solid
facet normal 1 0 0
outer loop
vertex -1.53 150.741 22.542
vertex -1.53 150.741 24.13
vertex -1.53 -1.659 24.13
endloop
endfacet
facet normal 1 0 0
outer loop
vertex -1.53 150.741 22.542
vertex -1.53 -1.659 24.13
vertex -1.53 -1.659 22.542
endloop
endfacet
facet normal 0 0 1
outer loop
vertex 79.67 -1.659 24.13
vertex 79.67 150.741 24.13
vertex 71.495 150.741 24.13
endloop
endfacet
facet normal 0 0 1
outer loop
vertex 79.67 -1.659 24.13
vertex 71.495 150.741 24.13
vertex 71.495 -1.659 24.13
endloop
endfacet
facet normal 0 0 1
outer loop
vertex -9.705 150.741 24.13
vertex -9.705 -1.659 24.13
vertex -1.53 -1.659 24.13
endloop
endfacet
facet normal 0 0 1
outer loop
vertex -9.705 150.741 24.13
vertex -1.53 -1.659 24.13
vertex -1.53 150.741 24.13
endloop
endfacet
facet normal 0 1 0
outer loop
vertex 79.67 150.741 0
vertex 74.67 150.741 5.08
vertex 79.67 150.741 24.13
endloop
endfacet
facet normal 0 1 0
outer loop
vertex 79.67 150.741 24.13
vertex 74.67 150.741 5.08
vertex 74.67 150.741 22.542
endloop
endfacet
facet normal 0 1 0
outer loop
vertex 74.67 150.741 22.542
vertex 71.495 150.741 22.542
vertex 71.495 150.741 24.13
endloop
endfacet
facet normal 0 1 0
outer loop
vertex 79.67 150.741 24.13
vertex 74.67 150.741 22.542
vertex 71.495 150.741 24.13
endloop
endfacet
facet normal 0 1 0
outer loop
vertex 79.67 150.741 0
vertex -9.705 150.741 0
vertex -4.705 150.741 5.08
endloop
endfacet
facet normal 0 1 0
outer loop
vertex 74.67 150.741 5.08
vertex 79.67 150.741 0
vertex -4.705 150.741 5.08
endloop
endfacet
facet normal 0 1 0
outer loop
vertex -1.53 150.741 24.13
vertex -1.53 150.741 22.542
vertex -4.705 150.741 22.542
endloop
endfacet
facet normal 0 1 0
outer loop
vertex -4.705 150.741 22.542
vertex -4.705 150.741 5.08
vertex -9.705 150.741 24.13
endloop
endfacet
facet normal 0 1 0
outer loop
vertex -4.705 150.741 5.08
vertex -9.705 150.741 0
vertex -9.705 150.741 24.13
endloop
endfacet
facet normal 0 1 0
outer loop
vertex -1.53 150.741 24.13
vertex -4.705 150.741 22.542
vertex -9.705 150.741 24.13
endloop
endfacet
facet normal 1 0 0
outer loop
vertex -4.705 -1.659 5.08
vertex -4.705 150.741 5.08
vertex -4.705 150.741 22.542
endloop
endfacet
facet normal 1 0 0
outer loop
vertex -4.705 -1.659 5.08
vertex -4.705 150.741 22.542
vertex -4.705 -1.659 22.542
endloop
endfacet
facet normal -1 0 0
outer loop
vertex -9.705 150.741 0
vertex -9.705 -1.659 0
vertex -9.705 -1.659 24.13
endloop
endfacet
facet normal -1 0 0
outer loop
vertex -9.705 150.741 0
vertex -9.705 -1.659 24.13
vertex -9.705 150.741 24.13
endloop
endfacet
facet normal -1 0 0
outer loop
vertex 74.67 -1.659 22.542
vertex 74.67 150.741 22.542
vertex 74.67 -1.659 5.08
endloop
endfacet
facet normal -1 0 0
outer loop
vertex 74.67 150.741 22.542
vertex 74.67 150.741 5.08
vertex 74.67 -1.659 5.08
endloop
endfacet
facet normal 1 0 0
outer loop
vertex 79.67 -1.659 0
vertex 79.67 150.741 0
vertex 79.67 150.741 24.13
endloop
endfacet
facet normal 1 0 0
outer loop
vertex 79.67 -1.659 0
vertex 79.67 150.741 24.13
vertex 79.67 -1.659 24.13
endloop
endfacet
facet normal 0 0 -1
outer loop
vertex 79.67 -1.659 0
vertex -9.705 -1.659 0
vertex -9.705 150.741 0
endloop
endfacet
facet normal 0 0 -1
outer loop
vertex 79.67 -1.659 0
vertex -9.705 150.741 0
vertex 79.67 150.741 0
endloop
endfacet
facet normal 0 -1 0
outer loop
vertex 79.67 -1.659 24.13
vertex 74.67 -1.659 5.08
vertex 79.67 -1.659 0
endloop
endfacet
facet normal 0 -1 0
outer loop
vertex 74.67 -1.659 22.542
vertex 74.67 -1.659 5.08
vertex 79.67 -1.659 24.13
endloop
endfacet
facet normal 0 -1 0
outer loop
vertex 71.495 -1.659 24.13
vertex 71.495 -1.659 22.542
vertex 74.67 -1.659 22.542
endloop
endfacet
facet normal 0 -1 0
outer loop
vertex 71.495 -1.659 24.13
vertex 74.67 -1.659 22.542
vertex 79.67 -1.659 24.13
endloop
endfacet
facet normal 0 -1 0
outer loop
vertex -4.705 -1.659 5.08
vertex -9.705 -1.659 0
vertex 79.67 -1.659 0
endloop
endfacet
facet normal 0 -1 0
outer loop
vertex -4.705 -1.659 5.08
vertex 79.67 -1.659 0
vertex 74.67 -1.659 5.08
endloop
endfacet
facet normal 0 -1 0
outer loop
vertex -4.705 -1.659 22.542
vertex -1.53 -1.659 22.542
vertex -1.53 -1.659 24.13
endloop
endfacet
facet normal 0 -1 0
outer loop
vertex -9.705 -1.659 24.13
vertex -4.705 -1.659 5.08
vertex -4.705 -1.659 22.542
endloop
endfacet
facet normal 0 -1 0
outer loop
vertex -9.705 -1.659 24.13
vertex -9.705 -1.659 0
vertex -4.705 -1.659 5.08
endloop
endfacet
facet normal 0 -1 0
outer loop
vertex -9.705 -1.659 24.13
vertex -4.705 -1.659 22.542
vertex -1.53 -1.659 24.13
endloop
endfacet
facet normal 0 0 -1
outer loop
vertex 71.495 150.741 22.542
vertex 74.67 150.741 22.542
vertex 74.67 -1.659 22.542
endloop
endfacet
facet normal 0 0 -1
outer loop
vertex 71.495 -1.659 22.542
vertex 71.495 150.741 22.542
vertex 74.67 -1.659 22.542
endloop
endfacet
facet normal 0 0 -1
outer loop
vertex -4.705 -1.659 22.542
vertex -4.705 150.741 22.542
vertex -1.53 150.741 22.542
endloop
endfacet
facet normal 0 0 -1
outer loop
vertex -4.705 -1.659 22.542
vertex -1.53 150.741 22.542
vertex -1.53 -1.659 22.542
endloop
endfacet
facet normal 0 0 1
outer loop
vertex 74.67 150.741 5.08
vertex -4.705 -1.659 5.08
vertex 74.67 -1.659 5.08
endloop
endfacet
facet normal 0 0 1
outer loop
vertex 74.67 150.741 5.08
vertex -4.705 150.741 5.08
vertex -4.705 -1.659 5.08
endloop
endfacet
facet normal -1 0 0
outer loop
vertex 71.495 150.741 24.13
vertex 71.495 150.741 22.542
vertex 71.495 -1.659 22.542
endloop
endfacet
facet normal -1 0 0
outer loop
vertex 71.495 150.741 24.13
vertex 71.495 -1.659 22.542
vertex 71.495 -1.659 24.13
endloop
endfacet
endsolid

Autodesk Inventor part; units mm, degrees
ref_plane "YZ Plane" through (0, 0, 0) normal (1, 0, 0) x (0, 1, 0)
ref_plane "XZ Plane" through (0, 0, 0) normal (0, 1, 0) x (-1, 0, 0)
ref_plane "XY Plane" through (0, 0, 0) normal (0, 0, 1) x (1, 0, 0)
sketch "Sketch1" plane through (0, 0, 0) normal (0, 0, 1) x (1, 0, 0)
  line L0 (-9.7052, 150.741) -> (79.6698, 150.741)
  line L1 (79.6698, 150.741) -> (79.6698, -1.659)
  line L2 (79.6698, -1.659) -> (-9.7052, -1.659)
  line L3 (-9.7052, -1.659) -> (-9.7052, 150.741)
  point P0 (0, 0)
  dimension "d0" = 89.375
  dimension "d1" = 152.4
extrude "Extrusion1" add sketch "Sketch1" along normal blind 5.08
sketch "Sketch2" plane through (0, 0, 5.08) normal (0, 0, 1) x (1, 0, 0)
  line L0 (79.6698, 150.741) -> (-9.7052, 150.741) projected
  line L1 (-9.7052, -1.659) -> (79.6698, -1.659) projected
  line L2 (-9.7052, 150.741) -> (-4.7052, 150.741)
  line L3 (-4.7052, 150.741) -> (-4.7052, -1.659)
  line L4 (-4.7052, -1.659) -> (-9.7052, -1.659)
  line L5 (-9.7052, -1.659) -> (-9.7052, 150.741)
  line L6 (79.6698, 150.741) -> (74.6698, 150.741)
  line L7 (74.6698, 150.741) -> (74.6698, -1.659)
  line L8 (74.6698, -1.659) -> (79.6698, -1.659)
  line L9 (79.6698, -1.659) -> (79.6698, 150.741)
  point P0 (0, 0)
  dimension "d4" = 5
  dimension "d5" = 5
extrude "Extrusion2" add sketch "Sketch2" along normal blind 19.05 contours L9 L1 L7 L0 | L3 L1 L5 L0
sketch "Sketch3" plane through (-4.7052, -1.659, 5.08) normal (1, 0, 0) x (0, 0, -1)
  line L0 (0, 152.4) -> (-19.05, 152.4) projected
  line L1 (0, 0) -> (-19.05, 0) projected
  line L2 (-19.05, 152.4) -> (-17.4625, 152.4)
  line L3 (-17.4625, 152.4) -> (-17.4625, 0)
  line L4 (-17.4625, 0) -> (-19.05, 0)
  line L5 (-19.05, 0) -> (-19.05, 152.4)
  point P0 (5.08, 1.659)
  dimension "d8" = 1.5875
sketch "Sketch4" plane through (74.6698, -1.659, 5.08) normal (-1, 0, 0) x (0, 0, 1)
  line L0 (19.05, 152.4) -> (19.05, 0) projected
  line L1 (0, 0) -> (19.05, 0) projected
  line L2 (19.05, 152.4) -> (17.4625, 152.4)
  line L3 (17.4625, 152.4) -> (17.4625, 0)
  line L4 (17.4625, 0) -> (19.05, 0)
  line L5 (19.05, 0) -> (19.05, 152.4)
  point P0 (-5.08, 1.659)
  dimension "d9" = 1.5875
extrude "Extrusion3" add sketch "Sketch4" along normal blind 3.175
extrude "Extrusion4" add sketch "Sketch3" along normal blind 3.175
properties part number "Phone Mount"
